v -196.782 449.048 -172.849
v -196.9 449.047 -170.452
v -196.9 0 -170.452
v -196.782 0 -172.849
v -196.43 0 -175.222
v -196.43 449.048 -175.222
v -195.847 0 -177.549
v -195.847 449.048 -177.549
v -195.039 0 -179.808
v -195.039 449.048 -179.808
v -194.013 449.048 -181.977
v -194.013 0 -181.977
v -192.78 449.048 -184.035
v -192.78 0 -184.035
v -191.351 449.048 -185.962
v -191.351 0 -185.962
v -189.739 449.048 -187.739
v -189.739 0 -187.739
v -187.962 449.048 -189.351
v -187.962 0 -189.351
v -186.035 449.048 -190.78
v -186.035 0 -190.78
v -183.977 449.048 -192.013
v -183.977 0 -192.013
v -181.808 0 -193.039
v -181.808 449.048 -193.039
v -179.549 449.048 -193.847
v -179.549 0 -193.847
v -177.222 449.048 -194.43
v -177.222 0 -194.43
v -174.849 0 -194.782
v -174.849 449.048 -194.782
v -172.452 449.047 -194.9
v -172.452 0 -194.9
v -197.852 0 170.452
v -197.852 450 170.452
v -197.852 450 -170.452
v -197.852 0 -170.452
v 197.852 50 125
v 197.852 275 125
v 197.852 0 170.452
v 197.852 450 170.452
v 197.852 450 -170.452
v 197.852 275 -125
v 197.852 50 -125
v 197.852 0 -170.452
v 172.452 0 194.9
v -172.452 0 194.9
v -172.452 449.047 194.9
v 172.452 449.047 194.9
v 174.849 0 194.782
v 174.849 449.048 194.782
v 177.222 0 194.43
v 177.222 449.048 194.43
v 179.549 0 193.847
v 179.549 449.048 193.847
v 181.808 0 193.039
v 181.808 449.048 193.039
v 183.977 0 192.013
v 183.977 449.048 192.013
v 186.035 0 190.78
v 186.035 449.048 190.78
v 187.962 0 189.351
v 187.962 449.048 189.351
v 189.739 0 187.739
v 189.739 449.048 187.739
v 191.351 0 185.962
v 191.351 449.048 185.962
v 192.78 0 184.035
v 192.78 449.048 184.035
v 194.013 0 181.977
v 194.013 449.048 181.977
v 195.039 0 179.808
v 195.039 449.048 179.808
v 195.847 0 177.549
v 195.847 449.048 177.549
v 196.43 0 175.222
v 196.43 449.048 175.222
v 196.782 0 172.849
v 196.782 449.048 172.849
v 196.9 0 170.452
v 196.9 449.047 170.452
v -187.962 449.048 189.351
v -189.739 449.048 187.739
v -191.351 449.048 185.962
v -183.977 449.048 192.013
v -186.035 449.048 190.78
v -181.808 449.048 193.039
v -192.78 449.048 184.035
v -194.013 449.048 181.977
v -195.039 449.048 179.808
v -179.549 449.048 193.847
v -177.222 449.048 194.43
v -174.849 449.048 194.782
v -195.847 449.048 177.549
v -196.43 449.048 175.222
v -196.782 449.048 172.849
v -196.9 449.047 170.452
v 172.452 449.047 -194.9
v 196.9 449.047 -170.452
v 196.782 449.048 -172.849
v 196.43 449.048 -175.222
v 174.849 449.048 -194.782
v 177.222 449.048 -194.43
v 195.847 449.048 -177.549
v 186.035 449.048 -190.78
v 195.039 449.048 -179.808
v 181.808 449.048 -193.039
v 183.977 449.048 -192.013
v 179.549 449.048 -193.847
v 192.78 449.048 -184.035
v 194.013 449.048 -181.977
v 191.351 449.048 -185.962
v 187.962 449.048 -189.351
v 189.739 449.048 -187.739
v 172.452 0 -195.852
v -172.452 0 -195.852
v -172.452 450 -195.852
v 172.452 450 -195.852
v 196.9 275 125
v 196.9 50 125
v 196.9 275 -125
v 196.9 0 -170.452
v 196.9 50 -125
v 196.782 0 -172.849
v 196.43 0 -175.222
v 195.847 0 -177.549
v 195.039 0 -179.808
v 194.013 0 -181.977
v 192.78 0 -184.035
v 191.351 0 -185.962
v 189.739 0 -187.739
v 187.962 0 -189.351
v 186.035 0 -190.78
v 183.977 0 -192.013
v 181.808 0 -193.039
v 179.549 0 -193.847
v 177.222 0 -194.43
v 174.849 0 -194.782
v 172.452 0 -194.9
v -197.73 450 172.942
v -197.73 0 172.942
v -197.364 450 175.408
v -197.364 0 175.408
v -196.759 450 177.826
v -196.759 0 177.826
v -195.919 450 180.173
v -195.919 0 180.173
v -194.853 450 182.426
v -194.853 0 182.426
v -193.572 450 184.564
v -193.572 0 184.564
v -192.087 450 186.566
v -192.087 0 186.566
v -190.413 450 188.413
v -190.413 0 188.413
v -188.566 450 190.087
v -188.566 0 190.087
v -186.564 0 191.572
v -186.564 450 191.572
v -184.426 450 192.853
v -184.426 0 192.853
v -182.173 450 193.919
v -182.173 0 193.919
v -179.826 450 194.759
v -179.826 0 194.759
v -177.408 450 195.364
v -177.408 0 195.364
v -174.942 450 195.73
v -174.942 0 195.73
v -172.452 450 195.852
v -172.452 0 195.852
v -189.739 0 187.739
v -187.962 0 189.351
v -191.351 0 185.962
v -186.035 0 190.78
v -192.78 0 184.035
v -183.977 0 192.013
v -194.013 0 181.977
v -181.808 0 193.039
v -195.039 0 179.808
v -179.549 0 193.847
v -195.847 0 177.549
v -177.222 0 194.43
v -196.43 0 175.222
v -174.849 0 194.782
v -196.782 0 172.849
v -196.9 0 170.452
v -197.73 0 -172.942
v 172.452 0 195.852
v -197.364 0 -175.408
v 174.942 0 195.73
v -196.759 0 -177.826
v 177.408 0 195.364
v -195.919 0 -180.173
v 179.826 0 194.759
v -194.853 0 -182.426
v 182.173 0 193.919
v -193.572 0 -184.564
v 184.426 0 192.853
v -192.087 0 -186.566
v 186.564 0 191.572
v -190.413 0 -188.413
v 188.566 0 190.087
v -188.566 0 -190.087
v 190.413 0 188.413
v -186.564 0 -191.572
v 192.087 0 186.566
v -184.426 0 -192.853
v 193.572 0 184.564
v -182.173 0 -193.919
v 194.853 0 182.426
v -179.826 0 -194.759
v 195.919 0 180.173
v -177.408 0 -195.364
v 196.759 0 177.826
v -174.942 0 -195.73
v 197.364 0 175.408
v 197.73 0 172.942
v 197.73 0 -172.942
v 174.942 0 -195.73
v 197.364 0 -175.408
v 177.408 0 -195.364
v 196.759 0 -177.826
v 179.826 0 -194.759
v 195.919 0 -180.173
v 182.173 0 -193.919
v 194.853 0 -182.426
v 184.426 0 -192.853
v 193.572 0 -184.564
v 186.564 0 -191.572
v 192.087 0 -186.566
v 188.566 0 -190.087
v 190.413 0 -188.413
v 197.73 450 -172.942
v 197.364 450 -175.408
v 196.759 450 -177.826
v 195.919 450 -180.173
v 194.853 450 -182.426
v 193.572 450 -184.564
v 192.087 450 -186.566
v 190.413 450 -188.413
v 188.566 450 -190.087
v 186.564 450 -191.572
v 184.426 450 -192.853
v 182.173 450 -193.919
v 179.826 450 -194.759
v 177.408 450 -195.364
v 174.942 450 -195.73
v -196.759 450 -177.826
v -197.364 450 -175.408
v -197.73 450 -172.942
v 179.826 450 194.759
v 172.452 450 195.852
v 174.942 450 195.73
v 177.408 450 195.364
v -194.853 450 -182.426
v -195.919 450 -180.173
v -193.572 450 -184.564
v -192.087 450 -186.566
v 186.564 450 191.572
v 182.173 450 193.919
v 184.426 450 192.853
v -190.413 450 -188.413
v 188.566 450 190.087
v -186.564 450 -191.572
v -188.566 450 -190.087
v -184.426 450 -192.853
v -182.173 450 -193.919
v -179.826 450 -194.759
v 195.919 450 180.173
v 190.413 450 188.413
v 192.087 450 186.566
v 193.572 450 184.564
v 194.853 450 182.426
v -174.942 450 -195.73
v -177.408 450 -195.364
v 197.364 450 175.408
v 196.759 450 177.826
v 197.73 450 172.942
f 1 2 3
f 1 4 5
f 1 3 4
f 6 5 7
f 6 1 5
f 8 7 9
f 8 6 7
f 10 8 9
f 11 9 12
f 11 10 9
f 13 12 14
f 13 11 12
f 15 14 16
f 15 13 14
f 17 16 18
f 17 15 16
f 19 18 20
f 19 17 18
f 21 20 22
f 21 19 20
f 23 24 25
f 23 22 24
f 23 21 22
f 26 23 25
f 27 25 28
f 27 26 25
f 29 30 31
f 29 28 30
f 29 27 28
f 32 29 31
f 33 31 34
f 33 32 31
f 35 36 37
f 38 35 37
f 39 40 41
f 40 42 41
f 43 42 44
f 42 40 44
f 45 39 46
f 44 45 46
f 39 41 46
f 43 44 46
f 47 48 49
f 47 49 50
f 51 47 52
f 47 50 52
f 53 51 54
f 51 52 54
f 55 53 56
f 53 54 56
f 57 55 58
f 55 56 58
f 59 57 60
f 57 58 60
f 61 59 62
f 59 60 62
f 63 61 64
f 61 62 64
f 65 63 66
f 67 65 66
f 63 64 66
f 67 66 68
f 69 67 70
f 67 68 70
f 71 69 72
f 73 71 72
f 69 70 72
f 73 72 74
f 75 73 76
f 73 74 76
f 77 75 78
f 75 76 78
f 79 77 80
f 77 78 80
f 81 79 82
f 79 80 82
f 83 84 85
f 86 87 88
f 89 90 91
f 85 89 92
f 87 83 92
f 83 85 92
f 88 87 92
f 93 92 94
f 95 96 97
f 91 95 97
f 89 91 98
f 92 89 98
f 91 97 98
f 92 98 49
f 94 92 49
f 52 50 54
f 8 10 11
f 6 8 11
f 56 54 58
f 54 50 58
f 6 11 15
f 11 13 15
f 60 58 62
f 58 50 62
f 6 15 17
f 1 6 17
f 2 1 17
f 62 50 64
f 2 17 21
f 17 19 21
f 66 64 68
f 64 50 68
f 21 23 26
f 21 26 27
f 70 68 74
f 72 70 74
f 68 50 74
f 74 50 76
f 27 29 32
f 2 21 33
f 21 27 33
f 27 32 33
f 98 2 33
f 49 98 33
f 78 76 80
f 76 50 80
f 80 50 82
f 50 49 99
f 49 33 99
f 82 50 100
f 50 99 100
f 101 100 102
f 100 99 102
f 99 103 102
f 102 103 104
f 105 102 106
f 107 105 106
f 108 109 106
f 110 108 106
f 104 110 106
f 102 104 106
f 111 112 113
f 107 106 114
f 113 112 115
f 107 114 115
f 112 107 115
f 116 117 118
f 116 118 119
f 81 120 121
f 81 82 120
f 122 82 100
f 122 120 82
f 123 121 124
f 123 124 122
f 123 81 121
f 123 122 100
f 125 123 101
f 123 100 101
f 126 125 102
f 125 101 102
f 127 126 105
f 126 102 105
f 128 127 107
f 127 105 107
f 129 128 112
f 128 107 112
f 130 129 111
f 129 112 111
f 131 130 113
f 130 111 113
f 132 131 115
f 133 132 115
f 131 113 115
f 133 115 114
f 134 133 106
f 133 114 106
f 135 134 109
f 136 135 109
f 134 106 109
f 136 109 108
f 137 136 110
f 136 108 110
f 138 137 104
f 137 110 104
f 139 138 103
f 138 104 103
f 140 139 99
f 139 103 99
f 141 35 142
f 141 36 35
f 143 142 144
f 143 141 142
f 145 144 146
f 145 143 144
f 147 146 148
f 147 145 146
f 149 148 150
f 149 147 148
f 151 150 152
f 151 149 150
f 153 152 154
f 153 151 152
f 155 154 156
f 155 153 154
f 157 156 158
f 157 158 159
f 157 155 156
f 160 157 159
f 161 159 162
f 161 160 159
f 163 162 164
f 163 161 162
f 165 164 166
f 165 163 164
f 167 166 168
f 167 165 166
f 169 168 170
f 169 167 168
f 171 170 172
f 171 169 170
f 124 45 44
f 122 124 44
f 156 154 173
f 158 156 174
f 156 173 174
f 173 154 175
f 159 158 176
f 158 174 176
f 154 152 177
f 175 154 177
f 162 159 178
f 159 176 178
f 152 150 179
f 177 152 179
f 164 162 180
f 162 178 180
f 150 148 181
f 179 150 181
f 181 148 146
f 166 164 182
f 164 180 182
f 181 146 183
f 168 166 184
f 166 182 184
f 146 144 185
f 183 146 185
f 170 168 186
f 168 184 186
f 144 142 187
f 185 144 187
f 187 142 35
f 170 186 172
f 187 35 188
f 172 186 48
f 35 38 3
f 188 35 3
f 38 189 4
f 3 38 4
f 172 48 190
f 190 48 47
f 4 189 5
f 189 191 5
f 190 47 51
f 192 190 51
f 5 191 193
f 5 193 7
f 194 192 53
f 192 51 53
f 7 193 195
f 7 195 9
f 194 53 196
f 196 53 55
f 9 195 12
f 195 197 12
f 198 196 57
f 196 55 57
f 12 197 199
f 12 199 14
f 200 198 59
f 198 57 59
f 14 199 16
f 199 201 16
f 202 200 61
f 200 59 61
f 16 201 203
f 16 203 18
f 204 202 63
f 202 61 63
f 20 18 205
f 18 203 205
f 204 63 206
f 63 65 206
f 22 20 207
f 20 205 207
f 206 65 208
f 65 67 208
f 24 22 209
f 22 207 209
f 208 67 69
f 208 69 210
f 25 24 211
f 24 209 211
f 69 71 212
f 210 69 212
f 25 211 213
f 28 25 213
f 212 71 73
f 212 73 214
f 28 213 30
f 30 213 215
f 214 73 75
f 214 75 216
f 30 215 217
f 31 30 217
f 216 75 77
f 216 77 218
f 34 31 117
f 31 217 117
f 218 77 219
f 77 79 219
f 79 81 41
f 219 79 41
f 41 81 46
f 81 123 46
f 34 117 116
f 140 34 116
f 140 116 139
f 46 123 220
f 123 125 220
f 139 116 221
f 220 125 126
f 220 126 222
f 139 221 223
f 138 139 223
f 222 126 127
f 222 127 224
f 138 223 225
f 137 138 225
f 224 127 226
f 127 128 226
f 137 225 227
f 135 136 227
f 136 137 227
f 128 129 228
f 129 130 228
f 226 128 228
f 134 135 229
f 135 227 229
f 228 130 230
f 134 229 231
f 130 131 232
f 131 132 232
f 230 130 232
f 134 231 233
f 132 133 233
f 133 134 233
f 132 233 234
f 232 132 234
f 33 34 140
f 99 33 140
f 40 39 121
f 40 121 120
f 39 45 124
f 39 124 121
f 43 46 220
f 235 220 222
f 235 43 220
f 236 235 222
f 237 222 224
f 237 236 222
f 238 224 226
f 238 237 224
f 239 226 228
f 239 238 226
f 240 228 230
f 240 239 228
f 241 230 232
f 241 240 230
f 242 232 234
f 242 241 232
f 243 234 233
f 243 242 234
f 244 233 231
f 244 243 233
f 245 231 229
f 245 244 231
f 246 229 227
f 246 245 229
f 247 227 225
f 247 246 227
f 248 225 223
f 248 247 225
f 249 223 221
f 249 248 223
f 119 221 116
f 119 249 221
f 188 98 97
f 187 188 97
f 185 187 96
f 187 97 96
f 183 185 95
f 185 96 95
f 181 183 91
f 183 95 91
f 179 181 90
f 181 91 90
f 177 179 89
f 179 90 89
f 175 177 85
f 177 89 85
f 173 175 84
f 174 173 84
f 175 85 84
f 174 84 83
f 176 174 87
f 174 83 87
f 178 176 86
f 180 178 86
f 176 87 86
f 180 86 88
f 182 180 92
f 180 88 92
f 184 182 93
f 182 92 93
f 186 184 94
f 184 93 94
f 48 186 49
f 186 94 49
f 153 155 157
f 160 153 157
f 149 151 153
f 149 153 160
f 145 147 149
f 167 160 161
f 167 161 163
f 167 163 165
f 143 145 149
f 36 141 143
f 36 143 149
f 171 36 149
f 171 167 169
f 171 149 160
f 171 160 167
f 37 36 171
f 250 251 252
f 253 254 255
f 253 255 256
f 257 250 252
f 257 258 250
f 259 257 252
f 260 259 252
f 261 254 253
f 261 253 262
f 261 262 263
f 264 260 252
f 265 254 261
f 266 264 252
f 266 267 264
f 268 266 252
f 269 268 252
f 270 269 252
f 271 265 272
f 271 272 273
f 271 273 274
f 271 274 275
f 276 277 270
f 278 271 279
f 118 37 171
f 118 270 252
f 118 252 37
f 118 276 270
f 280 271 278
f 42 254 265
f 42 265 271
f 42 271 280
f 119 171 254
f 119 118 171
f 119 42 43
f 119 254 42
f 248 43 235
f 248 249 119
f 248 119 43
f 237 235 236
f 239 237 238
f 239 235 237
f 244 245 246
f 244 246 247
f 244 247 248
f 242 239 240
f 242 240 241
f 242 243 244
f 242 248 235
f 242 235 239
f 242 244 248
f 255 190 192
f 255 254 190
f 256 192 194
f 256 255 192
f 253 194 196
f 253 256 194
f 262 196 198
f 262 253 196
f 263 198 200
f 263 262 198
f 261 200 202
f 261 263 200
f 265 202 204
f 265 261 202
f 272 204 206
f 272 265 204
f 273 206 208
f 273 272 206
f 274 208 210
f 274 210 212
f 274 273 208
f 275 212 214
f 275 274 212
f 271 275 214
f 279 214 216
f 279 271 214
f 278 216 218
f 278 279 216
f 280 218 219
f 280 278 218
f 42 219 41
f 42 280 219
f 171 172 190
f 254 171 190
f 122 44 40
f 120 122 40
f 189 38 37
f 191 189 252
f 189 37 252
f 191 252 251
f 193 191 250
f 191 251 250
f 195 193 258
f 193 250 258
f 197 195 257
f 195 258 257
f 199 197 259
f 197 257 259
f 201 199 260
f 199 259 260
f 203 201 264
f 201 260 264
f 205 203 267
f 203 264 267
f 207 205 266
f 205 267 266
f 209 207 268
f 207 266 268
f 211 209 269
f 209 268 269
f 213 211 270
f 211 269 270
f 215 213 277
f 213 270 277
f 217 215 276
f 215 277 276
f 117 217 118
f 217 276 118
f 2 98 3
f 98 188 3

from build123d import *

# Parameters (mm, degrees)
SKETCH1_W           = 395.70484
SKETCH1_H           = 391.70484
BOSS_EXTRUDE1_DEPTH = 450
FILLET1_R           = 25.4
SHELL1_T            = -0.9525
CUT_EXTRUDE1_REACH  = 397.705
SKETCH2_W           = 250
SKETCH2_H           = 225


with BuildPart() as part:
    # Sketch1 → Boss-Extrude1 (new body)
    with BuildSketch(Plane(origin=(0, 0, 0), x_dir=(1, 0, 0), z_dir=(0, 1, 0))):
        Rectangle(SKETCH1_W, SKETCH1_H)
    extrude(amount=BOSS_EXTRUDE1_DEPTH)

    # Fillet1
    fillet1_edges = [part.edges().sort_by_distance(p)[0] for p in [
        (-197.85242, 225, -195.85242),
        (197.85242, 225, -195.85242),
        (197.85242, 225, 195.85242),
        (-197.85242, 225, 195.85242),
    ]]
    fillet(fillet1_edges, radius=FILLET1_R)

    # Shell1
    shell1_openings = [part.faces().sort_by_distance(p)[0] for p in [
        (0, 0, 0),
    ]]
    offset(amount=SHELL1_T, openings=shell1_openings, kind=Kind.INTERSECTION)

    # Sketch2 → Cut-Extrude1 (cut, up to next)
    with BuildSketch(Plane(origin=(197.85242, 0, -2), x_dir=(0, 0, 1), z_dir=(-1, 0, 0)), mode=Mode.PRIVATE) as cut_extrude1_sk1:
        with Locations((2, 162.5)):
            Rectangle(SKETCH2_W, SKETCH2_H)
    cut_extrude1_tool1 = extrude(cut_extrude1_sk1.sketch, amount=CUT_EXTRUDE1_REACH, mode=Mode.PRIVATE) & part.part
    add(cut_extrude1_tool1.solids().sort_by_distance((197.85242, 162.5, 0))[0], mode=Mode.SUBTRACT)


solid = part.part
